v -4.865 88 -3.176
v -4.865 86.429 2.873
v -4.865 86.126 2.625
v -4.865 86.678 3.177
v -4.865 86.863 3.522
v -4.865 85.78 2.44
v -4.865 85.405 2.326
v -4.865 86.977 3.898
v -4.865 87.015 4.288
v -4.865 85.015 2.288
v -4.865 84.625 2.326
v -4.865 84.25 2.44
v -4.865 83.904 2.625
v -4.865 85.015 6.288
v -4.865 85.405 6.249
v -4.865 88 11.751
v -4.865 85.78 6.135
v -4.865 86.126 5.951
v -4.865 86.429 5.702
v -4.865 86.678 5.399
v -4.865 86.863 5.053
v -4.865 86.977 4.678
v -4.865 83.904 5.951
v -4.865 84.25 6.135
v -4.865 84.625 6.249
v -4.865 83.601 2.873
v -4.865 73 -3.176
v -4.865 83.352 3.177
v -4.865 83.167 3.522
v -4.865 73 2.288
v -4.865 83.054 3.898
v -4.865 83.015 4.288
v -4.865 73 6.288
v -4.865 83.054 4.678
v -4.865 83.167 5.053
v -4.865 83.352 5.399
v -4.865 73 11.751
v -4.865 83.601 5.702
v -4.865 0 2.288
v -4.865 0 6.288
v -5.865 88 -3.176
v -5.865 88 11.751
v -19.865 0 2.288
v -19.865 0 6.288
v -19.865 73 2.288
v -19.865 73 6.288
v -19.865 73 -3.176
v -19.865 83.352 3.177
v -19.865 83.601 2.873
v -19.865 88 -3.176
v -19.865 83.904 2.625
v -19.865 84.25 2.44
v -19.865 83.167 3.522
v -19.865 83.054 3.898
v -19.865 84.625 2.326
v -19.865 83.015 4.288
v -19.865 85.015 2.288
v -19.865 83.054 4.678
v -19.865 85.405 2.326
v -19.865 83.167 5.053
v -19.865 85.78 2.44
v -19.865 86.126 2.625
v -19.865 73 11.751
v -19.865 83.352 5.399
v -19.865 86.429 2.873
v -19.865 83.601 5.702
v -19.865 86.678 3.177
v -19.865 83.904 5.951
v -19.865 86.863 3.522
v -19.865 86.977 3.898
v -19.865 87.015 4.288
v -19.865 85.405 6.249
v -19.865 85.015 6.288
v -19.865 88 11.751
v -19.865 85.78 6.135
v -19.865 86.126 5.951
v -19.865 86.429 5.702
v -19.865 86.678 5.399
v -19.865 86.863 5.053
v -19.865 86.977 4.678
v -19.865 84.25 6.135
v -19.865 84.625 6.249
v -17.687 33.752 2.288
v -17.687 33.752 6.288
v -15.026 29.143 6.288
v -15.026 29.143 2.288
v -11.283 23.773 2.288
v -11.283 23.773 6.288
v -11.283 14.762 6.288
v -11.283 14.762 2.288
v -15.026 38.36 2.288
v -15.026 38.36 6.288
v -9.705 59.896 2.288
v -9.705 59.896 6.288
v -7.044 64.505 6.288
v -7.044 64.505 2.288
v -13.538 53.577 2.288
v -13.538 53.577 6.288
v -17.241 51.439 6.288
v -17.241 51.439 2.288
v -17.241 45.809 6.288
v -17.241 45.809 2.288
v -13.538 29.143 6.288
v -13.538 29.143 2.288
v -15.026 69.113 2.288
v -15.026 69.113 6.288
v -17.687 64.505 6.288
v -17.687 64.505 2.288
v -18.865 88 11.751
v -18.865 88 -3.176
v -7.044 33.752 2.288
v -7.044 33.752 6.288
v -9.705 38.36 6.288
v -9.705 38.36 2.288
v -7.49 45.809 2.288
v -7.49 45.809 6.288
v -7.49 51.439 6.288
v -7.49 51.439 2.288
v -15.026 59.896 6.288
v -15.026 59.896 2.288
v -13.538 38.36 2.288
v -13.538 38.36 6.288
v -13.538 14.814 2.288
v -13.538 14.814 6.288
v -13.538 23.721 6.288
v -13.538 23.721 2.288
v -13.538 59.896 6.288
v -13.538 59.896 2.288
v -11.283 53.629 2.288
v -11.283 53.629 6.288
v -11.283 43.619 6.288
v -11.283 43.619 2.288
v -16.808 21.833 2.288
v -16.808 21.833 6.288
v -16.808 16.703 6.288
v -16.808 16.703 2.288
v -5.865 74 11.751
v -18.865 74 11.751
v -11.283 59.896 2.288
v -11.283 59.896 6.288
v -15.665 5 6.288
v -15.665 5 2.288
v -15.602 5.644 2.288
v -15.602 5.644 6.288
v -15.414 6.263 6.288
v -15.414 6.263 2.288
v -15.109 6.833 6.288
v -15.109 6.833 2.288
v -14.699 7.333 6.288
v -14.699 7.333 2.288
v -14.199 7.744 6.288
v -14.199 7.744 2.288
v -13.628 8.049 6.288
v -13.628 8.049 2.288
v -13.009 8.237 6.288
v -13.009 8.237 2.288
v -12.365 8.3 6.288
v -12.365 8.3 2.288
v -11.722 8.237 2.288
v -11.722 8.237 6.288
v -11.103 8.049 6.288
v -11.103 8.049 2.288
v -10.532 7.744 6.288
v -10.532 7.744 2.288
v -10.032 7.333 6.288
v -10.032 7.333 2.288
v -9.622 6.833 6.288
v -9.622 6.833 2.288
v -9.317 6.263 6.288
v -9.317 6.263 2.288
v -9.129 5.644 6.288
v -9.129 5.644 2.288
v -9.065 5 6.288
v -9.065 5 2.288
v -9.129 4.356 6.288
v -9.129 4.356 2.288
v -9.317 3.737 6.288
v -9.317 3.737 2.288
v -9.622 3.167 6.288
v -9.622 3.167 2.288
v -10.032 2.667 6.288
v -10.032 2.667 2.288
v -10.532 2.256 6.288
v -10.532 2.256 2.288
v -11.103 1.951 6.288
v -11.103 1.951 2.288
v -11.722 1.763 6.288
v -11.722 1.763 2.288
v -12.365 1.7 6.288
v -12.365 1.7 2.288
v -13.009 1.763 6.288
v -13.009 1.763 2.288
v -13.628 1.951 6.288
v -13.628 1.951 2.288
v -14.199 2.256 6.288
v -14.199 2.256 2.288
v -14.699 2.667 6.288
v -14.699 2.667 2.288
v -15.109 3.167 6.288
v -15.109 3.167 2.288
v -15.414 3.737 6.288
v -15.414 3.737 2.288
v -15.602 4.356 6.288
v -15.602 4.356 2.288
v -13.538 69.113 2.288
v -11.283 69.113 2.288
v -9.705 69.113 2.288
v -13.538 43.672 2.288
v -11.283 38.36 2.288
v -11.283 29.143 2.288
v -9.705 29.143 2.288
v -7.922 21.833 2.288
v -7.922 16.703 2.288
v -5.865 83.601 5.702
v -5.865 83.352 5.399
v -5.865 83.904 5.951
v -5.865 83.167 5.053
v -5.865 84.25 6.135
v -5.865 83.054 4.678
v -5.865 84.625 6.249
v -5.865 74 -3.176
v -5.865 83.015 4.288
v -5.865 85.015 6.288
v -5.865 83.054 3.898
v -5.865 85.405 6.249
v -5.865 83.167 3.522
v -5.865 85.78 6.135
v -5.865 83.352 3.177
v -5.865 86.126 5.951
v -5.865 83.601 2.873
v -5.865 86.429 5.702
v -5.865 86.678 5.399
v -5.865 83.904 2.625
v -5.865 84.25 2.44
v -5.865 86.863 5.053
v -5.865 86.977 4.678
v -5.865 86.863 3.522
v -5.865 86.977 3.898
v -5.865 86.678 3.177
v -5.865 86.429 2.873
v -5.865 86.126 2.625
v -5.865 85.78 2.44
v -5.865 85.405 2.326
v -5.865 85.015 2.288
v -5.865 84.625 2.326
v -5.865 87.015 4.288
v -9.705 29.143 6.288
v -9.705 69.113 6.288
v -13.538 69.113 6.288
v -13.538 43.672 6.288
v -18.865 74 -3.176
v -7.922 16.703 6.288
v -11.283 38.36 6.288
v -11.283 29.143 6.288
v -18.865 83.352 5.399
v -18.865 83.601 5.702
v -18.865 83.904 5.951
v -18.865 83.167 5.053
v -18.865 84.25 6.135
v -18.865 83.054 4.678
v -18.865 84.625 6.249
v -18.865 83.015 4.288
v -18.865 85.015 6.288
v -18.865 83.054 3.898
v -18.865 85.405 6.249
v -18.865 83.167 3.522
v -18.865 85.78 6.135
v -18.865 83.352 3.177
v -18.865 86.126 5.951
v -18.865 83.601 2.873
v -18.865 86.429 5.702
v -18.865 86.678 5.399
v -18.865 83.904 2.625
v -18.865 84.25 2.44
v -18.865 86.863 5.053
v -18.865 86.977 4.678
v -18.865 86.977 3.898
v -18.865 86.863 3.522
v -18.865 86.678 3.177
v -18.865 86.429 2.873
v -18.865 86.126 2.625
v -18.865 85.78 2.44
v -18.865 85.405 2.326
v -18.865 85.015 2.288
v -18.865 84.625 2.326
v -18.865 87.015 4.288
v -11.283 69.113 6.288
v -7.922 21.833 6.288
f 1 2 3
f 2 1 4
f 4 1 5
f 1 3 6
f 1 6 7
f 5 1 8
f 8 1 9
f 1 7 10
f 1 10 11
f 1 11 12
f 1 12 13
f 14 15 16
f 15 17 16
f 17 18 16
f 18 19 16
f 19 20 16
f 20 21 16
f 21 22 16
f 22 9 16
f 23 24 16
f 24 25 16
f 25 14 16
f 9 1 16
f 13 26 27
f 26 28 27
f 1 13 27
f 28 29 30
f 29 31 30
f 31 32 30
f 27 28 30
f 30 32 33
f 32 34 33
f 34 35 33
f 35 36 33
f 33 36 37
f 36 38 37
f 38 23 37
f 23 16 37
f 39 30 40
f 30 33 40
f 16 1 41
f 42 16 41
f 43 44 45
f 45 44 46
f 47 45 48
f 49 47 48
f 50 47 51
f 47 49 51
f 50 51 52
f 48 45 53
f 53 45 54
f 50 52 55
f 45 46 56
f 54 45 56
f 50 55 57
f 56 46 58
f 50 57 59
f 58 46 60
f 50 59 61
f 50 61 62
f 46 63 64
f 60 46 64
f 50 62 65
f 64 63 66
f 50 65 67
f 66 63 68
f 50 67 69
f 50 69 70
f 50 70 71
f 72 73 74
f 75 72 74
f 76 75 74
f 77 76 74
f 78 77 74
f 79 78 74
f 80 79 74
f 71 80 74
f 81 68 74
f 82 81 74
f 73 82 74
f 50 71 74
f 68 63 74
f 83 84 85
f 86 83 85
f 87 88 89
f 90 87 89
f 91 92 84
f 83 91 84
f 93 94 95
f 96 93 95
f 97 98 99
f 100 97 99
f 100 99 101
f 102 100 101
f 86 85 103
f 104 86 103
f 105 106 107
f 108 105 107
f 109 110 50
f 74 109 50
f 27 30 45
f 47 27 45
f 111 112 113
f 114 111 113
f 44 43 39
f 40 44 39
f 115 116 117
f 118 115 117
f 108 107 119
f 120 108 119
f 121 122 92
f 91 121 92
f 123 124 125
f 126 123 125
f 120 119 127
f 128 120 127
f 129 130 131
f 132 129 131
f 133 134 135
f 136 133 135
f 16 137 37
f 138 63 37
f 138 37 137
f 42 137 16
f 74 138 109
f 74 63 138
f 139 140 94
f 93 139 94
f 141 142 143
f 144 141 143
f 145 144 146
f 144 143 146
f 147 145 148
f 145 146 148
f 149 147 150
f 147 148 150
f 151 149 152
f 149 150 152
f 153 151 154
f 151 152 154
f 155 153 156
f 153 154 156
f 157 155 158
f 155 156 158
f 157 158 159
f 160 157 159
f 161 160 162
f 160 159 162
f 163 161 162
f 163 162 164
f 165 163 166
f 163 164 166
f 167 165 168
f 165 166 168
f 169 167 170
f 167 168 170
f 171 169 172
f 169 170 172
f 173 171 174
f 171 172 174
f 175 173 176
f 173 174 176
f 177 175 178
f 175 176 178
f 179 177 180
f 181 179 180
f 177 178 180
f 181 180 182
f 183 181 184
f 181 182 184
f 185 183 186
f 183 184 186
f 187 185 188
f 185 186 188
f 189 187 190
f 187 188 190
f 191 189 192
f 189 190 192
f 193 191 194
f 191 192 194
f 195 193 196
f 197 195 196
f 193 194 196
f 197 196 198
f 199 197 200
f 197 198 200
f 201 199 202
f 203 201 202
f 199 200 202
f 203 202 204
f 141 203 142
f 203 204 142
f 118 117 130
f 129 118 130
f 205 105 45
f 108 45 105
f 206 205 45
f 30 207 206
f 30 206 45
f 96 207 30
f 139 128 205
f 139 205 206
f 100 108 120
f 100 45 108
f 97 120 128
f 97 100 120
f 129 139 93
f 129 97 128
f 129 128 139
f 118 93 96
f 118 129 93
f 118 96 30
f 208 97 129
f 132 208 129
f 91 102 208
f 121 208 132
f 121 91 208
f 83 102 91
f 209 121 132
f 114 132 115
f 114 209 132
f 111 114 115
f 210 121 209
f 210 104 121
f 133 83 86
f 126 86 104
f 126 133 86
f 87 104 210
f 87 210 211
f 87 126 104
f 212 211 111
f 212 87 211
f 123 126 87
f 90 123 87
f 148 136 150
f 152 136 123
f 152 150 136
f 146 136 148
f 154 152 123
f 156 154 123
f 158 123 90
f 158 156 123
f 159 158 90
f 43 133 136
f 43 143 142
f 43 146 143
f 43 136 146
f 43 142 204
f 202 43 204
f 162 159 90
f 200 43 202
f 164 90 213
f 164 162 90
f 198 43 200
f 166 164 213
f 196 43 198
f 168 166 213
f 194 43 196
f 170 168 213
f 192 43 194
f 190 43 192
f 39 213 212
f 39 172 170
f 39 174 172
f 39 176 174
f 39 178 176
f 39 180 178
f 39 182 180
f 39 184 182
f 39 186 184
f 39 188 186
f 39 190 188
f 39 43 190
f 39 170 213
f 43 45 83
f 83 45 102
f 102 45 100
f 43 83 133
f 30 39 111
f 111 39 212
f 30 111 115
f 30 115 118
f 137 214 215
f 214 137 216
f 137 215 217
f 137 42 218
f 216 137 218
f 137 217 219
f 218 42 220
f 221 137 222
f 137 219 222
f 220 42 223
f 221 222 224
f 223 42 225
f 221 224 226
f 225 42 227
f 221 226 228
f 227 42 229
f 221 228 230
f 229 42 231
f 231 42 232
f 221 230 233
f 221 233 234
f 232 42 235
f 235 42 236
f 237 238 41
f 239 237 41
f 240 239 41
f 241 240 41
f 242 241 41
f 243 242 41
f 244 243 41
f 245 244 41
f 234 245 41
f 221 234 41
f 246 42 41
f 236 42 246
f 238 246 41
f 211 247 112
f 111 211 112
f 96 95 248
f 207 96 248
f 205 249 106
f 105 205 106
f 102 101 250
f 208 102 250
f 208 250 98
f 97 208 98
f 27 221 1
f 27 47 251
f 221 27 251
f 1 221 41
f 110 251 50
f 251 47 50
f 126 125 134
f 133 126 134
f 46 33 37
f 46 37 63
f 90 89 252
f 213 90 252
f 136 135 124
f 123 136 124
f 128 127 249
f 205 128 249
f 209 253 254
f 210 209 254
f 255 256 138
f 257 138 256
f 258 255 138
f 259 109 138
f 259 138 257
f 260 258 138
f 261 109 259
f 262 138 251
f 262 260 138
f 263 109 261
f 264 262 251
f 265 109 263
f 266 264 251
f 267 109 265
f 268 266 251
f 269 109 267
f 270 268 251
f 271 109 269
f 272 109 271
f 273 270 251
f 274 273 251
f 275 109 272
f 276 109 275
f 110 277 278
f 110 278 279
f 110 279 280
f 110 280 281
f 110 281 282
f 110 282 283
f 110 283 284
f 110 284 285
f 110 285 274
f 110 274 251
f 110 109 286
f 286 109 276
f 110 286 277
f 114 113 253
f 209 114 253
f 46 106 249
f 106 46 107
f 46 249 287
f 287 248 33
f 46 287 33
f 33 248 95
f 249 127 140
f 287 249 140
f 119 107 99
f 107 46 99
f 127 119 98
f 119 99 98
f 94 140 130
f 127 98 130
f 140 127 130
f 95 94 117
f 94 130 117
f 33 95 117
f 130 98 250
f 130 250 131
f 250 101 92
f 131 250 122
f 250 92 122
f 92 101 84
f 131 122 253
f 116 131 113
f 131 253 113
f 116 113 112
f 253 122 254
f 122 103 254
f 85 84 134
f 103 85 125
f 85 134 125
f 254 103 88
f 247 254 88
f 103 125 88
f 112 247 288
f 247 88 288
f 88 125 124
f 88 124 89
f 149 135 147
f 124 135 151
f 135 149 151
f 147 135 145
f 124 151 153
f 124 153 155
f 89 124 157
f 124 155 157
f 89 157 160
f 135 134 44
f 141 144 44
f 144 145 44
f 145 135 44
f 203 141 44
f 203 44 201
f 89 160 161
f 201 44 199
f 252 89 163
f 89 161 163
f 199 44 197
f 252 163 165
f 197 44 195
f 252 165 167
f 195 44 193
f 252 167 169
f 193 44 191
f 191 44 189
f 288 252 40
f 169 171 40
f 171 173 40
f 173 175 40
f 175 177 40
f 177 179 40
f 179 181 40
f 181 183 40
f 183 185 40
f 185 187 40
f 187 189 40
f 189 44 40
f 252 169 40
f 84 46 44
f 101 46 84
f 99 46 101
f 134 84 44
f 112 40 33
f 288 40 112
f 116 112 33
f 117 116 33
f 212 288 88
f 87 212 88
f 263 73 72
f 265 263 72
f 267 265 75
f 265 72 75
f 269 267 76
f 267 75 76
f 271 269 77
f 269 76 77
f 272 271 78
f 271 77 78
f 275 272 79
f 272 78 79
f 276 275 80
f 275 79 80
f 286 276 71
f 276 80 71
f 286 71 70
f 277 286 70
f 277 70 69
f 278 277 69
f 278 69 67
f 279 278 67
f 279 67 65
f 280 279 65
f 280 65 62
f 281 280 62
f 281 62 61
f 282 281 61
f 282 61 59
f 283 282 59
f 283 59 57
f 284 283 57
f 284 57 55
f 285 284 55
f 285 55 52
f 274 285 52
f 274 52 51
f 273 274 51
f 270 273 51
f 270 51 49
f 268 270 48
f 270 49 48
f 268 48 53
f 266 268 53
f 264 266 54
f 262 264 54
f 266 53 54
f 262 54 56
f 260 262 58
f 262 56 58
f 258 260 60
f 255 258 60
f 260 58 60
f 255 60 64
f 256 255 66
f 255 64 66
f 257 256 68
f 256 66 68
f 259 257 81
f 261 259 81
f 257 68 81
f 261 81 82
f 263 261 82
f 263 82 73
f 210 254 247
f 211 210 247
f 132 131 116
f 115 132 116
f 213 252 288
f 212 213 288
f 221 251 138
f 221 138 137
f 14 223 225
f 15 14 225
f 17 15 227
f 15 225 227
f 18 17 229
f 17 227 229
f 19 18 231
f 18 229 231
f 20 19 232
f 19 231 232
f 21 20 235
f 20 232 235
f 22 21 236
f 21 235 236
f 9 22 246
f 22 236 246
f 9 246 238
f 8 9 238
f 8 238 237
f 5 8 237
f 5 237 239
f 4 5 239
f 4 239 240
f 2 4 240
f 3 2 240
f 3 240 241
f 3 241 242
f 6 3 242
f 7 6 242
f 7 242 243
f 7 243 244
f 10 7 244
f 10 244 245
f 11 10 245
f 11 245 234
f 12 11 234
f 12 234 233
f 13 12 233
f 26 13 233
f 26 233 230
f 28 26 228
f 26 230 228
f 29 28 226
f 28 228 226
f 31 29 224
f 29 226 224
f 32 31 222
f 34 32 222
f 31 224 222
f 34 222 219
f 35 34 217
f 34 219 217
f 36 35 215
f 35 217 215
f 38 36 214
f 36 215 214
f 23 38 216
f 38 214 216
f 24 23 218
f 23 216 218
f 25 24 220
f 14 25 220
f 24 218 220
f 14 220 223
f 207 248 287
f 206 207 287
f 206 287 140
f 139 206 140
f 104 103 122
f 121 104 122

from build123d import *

# Parameters (mm, degrees)
SKETCH_1_W           = 15
SKETCH_1_H           = 4
EXTRUDE_1_DEPTH      = 85
SKETCH_17_W          = 15
SKETCH_17_H          = 12
SKETCH_17_H_2        = 3
EXTRUDE_2_DEPTH      = 10
EXTRUDE_2_DEPTH_BACK = 14
SKETCH_18_W          = 13
SKETCH_18_H          = 24
CUT_EXTRUDE_4_DEPTH  = 14
SKETCH_20_W          = 4.536667306
SKETCH_20_H          = 15
SKETCH_20_W_2        = 4.536667307
CUT_EXTRUDE_6_DEPTH  = 18
SKETCH_21_R          = 2
CUT_EXTRUDE_7_DEPTH  = 39
SKETCH_22_R          = 3.3
CUT_EXTRUDE_8_DEPTH  = 4
CUT_EXTRUDE_9_DEPTH  = 4


with BuildPart() as part:
    # 草图1 → 凸台-拉伸1 (new body)
    with BuildSketch(Plane(origin=(0, 0, 0), x_dir=(1, 0, 0), z_dir=(0, 1, 0))):
        with Locations((-12.365471303, -4.287695046)):
            Rectangle(SKETCH_1_W, SKETCH_1_H)
    extrude(amount=EXTRUDE_1_DEPTH)

    # 草图17 → 凸台-拉伸2 (add, two sides)
    with BuildSketch(Plane(origin=(0, 0, 2.287695046), x_dir=(-1, 0, 0), z_dir=(0, 0, -1))) as extrude_2_sk:
        with Locations((12.365471303, 79)):
            Rectangle(SKETCH_17_W, SKETCH_17_H)
        with Locations((12.365471303, 86.5)):
            Rectangle(SKETCH_17_W, SKETCH_17_H_2)
    extrude(amount=EXTRUDE_2_DEPTH)
    extrude(extrude_2_sk.sketch, amount=-EXTRUDE_2_DEPTH_BACK)

    # 草图18 → 切除-拉伸4 (cut)
    with BuildSketch(Plane(origin=(0, 88, 0), x_dir=(1, 0, 0), z_dir=(0, 1, 0))):
        with Locations((-12.365471303, -4.287695046)):
            Rectangle(SKETCH_18_W, SKETCH_18_H)
    extrude(amount=-CUT_EXTRUDE_4_DEPTH, mode=Mode.SUBTRACT)

    # 草图20 → 切除-拉伸6 (cut)
    with BuildSketch(Plane.ZY.offset(19.865471303)):
        with Locations((-5.443971301, 80.5)):
            Rectangle(SKETCH_20_W, SKETCH_20_H)
        with Locations((14.019361393, 80.5)):
            Rectangle(SKETCH_20_W_2, SKETCH_20_H)
    extrude(amount=-CUT_EXTRUDE_6_DEPTH, mode=Mode.SUBTRACT)

    # 草图21 → 切除-拉伸7 (cut)
    with BuildSketch(Plane.ZY.offset(19.865471303)):
        with Locations((4.287695046, 85.015112755)):
            Circle(SKETCH_21_R)
    extrude(amount=-CUT_EXTRUDE_7_DEPTH, mode=Mode.SUBTRACT)

    # 草图22 → 切除-拉伸8 (cut)
    with BuildSketch(Plane(origin=(0, 0, 2.287695046), x_dir=(-1, 0, 0), z_dir=(0, 0, -1))):
        with Locations((12.365471303, 5)):
            Circle(SKETCH_22_R)
    extrude(amount=-CUT_EXTRUDE_8_DEPTH, mode=Mode.SUBTRACT)

    # 草图23 → 切除-拉伸9 (cut)
    with BuildSketch(Plane.XY.offset(6.287695046)):
        Polygon((-13.537897134, 59.896284907), (-13.537897134, 69.113447), (-15.026236811, 69.113447), (-17.687002319, 64.504865953), (-15.026236811, 59.896284907), align=None)
        Polygon((-9.704705795, 59.896284907), (-7.043940288, 64.504865953), (-9.704705795, 69.113447), (-11.283232075, 69.113447), (-11.283232075, 59.896284907), align=None)
        Polygon((-13.537897134, 43.671503457), (-13.537897134, 53.576980938), (-17.240881786, 51.439061752), (-17.240881786, 45.809422642), align=None)
        Polygon((-7.49006082, 51.439061752), (-11.283232075, 53.629050197), (-11.283232075, 43.619434197), (-7.49006082, 45.809422642), align=None)
        Polygon((-13.537897134, 29.143330966), (-13.537897134, 38.360493059), (-15.026236811, 38.360493059), (-17.687002319, 33.751912013), (-15.026236811, 29.143330966), align=None)
        Polygon((-9.704705795, 38.360493059), (-11.283232075, 38.360493059), (-11.283232075, 29.143330966), (-9.704705795, 29.143330966), (-7.043940288, 33.751912013), align=None)
        Polygon((-13.537897134, 14.814321043), (-13.537897134, 23.721128572), (-16.808445012, 21.832876874), (-16.808445012, 16.70257274), align=None)
        Polygon((-7.922497595, 21.832876874), (-11.283232075, 23.773197831), (-11.283232075, 14.762251783), (-7.922497595, 16.70257274), align=None)
    extrude(amount=-CUT_EXTRUDE_9_DEPTH, mode=Mode.SUBTRACT)


solid = part.part
